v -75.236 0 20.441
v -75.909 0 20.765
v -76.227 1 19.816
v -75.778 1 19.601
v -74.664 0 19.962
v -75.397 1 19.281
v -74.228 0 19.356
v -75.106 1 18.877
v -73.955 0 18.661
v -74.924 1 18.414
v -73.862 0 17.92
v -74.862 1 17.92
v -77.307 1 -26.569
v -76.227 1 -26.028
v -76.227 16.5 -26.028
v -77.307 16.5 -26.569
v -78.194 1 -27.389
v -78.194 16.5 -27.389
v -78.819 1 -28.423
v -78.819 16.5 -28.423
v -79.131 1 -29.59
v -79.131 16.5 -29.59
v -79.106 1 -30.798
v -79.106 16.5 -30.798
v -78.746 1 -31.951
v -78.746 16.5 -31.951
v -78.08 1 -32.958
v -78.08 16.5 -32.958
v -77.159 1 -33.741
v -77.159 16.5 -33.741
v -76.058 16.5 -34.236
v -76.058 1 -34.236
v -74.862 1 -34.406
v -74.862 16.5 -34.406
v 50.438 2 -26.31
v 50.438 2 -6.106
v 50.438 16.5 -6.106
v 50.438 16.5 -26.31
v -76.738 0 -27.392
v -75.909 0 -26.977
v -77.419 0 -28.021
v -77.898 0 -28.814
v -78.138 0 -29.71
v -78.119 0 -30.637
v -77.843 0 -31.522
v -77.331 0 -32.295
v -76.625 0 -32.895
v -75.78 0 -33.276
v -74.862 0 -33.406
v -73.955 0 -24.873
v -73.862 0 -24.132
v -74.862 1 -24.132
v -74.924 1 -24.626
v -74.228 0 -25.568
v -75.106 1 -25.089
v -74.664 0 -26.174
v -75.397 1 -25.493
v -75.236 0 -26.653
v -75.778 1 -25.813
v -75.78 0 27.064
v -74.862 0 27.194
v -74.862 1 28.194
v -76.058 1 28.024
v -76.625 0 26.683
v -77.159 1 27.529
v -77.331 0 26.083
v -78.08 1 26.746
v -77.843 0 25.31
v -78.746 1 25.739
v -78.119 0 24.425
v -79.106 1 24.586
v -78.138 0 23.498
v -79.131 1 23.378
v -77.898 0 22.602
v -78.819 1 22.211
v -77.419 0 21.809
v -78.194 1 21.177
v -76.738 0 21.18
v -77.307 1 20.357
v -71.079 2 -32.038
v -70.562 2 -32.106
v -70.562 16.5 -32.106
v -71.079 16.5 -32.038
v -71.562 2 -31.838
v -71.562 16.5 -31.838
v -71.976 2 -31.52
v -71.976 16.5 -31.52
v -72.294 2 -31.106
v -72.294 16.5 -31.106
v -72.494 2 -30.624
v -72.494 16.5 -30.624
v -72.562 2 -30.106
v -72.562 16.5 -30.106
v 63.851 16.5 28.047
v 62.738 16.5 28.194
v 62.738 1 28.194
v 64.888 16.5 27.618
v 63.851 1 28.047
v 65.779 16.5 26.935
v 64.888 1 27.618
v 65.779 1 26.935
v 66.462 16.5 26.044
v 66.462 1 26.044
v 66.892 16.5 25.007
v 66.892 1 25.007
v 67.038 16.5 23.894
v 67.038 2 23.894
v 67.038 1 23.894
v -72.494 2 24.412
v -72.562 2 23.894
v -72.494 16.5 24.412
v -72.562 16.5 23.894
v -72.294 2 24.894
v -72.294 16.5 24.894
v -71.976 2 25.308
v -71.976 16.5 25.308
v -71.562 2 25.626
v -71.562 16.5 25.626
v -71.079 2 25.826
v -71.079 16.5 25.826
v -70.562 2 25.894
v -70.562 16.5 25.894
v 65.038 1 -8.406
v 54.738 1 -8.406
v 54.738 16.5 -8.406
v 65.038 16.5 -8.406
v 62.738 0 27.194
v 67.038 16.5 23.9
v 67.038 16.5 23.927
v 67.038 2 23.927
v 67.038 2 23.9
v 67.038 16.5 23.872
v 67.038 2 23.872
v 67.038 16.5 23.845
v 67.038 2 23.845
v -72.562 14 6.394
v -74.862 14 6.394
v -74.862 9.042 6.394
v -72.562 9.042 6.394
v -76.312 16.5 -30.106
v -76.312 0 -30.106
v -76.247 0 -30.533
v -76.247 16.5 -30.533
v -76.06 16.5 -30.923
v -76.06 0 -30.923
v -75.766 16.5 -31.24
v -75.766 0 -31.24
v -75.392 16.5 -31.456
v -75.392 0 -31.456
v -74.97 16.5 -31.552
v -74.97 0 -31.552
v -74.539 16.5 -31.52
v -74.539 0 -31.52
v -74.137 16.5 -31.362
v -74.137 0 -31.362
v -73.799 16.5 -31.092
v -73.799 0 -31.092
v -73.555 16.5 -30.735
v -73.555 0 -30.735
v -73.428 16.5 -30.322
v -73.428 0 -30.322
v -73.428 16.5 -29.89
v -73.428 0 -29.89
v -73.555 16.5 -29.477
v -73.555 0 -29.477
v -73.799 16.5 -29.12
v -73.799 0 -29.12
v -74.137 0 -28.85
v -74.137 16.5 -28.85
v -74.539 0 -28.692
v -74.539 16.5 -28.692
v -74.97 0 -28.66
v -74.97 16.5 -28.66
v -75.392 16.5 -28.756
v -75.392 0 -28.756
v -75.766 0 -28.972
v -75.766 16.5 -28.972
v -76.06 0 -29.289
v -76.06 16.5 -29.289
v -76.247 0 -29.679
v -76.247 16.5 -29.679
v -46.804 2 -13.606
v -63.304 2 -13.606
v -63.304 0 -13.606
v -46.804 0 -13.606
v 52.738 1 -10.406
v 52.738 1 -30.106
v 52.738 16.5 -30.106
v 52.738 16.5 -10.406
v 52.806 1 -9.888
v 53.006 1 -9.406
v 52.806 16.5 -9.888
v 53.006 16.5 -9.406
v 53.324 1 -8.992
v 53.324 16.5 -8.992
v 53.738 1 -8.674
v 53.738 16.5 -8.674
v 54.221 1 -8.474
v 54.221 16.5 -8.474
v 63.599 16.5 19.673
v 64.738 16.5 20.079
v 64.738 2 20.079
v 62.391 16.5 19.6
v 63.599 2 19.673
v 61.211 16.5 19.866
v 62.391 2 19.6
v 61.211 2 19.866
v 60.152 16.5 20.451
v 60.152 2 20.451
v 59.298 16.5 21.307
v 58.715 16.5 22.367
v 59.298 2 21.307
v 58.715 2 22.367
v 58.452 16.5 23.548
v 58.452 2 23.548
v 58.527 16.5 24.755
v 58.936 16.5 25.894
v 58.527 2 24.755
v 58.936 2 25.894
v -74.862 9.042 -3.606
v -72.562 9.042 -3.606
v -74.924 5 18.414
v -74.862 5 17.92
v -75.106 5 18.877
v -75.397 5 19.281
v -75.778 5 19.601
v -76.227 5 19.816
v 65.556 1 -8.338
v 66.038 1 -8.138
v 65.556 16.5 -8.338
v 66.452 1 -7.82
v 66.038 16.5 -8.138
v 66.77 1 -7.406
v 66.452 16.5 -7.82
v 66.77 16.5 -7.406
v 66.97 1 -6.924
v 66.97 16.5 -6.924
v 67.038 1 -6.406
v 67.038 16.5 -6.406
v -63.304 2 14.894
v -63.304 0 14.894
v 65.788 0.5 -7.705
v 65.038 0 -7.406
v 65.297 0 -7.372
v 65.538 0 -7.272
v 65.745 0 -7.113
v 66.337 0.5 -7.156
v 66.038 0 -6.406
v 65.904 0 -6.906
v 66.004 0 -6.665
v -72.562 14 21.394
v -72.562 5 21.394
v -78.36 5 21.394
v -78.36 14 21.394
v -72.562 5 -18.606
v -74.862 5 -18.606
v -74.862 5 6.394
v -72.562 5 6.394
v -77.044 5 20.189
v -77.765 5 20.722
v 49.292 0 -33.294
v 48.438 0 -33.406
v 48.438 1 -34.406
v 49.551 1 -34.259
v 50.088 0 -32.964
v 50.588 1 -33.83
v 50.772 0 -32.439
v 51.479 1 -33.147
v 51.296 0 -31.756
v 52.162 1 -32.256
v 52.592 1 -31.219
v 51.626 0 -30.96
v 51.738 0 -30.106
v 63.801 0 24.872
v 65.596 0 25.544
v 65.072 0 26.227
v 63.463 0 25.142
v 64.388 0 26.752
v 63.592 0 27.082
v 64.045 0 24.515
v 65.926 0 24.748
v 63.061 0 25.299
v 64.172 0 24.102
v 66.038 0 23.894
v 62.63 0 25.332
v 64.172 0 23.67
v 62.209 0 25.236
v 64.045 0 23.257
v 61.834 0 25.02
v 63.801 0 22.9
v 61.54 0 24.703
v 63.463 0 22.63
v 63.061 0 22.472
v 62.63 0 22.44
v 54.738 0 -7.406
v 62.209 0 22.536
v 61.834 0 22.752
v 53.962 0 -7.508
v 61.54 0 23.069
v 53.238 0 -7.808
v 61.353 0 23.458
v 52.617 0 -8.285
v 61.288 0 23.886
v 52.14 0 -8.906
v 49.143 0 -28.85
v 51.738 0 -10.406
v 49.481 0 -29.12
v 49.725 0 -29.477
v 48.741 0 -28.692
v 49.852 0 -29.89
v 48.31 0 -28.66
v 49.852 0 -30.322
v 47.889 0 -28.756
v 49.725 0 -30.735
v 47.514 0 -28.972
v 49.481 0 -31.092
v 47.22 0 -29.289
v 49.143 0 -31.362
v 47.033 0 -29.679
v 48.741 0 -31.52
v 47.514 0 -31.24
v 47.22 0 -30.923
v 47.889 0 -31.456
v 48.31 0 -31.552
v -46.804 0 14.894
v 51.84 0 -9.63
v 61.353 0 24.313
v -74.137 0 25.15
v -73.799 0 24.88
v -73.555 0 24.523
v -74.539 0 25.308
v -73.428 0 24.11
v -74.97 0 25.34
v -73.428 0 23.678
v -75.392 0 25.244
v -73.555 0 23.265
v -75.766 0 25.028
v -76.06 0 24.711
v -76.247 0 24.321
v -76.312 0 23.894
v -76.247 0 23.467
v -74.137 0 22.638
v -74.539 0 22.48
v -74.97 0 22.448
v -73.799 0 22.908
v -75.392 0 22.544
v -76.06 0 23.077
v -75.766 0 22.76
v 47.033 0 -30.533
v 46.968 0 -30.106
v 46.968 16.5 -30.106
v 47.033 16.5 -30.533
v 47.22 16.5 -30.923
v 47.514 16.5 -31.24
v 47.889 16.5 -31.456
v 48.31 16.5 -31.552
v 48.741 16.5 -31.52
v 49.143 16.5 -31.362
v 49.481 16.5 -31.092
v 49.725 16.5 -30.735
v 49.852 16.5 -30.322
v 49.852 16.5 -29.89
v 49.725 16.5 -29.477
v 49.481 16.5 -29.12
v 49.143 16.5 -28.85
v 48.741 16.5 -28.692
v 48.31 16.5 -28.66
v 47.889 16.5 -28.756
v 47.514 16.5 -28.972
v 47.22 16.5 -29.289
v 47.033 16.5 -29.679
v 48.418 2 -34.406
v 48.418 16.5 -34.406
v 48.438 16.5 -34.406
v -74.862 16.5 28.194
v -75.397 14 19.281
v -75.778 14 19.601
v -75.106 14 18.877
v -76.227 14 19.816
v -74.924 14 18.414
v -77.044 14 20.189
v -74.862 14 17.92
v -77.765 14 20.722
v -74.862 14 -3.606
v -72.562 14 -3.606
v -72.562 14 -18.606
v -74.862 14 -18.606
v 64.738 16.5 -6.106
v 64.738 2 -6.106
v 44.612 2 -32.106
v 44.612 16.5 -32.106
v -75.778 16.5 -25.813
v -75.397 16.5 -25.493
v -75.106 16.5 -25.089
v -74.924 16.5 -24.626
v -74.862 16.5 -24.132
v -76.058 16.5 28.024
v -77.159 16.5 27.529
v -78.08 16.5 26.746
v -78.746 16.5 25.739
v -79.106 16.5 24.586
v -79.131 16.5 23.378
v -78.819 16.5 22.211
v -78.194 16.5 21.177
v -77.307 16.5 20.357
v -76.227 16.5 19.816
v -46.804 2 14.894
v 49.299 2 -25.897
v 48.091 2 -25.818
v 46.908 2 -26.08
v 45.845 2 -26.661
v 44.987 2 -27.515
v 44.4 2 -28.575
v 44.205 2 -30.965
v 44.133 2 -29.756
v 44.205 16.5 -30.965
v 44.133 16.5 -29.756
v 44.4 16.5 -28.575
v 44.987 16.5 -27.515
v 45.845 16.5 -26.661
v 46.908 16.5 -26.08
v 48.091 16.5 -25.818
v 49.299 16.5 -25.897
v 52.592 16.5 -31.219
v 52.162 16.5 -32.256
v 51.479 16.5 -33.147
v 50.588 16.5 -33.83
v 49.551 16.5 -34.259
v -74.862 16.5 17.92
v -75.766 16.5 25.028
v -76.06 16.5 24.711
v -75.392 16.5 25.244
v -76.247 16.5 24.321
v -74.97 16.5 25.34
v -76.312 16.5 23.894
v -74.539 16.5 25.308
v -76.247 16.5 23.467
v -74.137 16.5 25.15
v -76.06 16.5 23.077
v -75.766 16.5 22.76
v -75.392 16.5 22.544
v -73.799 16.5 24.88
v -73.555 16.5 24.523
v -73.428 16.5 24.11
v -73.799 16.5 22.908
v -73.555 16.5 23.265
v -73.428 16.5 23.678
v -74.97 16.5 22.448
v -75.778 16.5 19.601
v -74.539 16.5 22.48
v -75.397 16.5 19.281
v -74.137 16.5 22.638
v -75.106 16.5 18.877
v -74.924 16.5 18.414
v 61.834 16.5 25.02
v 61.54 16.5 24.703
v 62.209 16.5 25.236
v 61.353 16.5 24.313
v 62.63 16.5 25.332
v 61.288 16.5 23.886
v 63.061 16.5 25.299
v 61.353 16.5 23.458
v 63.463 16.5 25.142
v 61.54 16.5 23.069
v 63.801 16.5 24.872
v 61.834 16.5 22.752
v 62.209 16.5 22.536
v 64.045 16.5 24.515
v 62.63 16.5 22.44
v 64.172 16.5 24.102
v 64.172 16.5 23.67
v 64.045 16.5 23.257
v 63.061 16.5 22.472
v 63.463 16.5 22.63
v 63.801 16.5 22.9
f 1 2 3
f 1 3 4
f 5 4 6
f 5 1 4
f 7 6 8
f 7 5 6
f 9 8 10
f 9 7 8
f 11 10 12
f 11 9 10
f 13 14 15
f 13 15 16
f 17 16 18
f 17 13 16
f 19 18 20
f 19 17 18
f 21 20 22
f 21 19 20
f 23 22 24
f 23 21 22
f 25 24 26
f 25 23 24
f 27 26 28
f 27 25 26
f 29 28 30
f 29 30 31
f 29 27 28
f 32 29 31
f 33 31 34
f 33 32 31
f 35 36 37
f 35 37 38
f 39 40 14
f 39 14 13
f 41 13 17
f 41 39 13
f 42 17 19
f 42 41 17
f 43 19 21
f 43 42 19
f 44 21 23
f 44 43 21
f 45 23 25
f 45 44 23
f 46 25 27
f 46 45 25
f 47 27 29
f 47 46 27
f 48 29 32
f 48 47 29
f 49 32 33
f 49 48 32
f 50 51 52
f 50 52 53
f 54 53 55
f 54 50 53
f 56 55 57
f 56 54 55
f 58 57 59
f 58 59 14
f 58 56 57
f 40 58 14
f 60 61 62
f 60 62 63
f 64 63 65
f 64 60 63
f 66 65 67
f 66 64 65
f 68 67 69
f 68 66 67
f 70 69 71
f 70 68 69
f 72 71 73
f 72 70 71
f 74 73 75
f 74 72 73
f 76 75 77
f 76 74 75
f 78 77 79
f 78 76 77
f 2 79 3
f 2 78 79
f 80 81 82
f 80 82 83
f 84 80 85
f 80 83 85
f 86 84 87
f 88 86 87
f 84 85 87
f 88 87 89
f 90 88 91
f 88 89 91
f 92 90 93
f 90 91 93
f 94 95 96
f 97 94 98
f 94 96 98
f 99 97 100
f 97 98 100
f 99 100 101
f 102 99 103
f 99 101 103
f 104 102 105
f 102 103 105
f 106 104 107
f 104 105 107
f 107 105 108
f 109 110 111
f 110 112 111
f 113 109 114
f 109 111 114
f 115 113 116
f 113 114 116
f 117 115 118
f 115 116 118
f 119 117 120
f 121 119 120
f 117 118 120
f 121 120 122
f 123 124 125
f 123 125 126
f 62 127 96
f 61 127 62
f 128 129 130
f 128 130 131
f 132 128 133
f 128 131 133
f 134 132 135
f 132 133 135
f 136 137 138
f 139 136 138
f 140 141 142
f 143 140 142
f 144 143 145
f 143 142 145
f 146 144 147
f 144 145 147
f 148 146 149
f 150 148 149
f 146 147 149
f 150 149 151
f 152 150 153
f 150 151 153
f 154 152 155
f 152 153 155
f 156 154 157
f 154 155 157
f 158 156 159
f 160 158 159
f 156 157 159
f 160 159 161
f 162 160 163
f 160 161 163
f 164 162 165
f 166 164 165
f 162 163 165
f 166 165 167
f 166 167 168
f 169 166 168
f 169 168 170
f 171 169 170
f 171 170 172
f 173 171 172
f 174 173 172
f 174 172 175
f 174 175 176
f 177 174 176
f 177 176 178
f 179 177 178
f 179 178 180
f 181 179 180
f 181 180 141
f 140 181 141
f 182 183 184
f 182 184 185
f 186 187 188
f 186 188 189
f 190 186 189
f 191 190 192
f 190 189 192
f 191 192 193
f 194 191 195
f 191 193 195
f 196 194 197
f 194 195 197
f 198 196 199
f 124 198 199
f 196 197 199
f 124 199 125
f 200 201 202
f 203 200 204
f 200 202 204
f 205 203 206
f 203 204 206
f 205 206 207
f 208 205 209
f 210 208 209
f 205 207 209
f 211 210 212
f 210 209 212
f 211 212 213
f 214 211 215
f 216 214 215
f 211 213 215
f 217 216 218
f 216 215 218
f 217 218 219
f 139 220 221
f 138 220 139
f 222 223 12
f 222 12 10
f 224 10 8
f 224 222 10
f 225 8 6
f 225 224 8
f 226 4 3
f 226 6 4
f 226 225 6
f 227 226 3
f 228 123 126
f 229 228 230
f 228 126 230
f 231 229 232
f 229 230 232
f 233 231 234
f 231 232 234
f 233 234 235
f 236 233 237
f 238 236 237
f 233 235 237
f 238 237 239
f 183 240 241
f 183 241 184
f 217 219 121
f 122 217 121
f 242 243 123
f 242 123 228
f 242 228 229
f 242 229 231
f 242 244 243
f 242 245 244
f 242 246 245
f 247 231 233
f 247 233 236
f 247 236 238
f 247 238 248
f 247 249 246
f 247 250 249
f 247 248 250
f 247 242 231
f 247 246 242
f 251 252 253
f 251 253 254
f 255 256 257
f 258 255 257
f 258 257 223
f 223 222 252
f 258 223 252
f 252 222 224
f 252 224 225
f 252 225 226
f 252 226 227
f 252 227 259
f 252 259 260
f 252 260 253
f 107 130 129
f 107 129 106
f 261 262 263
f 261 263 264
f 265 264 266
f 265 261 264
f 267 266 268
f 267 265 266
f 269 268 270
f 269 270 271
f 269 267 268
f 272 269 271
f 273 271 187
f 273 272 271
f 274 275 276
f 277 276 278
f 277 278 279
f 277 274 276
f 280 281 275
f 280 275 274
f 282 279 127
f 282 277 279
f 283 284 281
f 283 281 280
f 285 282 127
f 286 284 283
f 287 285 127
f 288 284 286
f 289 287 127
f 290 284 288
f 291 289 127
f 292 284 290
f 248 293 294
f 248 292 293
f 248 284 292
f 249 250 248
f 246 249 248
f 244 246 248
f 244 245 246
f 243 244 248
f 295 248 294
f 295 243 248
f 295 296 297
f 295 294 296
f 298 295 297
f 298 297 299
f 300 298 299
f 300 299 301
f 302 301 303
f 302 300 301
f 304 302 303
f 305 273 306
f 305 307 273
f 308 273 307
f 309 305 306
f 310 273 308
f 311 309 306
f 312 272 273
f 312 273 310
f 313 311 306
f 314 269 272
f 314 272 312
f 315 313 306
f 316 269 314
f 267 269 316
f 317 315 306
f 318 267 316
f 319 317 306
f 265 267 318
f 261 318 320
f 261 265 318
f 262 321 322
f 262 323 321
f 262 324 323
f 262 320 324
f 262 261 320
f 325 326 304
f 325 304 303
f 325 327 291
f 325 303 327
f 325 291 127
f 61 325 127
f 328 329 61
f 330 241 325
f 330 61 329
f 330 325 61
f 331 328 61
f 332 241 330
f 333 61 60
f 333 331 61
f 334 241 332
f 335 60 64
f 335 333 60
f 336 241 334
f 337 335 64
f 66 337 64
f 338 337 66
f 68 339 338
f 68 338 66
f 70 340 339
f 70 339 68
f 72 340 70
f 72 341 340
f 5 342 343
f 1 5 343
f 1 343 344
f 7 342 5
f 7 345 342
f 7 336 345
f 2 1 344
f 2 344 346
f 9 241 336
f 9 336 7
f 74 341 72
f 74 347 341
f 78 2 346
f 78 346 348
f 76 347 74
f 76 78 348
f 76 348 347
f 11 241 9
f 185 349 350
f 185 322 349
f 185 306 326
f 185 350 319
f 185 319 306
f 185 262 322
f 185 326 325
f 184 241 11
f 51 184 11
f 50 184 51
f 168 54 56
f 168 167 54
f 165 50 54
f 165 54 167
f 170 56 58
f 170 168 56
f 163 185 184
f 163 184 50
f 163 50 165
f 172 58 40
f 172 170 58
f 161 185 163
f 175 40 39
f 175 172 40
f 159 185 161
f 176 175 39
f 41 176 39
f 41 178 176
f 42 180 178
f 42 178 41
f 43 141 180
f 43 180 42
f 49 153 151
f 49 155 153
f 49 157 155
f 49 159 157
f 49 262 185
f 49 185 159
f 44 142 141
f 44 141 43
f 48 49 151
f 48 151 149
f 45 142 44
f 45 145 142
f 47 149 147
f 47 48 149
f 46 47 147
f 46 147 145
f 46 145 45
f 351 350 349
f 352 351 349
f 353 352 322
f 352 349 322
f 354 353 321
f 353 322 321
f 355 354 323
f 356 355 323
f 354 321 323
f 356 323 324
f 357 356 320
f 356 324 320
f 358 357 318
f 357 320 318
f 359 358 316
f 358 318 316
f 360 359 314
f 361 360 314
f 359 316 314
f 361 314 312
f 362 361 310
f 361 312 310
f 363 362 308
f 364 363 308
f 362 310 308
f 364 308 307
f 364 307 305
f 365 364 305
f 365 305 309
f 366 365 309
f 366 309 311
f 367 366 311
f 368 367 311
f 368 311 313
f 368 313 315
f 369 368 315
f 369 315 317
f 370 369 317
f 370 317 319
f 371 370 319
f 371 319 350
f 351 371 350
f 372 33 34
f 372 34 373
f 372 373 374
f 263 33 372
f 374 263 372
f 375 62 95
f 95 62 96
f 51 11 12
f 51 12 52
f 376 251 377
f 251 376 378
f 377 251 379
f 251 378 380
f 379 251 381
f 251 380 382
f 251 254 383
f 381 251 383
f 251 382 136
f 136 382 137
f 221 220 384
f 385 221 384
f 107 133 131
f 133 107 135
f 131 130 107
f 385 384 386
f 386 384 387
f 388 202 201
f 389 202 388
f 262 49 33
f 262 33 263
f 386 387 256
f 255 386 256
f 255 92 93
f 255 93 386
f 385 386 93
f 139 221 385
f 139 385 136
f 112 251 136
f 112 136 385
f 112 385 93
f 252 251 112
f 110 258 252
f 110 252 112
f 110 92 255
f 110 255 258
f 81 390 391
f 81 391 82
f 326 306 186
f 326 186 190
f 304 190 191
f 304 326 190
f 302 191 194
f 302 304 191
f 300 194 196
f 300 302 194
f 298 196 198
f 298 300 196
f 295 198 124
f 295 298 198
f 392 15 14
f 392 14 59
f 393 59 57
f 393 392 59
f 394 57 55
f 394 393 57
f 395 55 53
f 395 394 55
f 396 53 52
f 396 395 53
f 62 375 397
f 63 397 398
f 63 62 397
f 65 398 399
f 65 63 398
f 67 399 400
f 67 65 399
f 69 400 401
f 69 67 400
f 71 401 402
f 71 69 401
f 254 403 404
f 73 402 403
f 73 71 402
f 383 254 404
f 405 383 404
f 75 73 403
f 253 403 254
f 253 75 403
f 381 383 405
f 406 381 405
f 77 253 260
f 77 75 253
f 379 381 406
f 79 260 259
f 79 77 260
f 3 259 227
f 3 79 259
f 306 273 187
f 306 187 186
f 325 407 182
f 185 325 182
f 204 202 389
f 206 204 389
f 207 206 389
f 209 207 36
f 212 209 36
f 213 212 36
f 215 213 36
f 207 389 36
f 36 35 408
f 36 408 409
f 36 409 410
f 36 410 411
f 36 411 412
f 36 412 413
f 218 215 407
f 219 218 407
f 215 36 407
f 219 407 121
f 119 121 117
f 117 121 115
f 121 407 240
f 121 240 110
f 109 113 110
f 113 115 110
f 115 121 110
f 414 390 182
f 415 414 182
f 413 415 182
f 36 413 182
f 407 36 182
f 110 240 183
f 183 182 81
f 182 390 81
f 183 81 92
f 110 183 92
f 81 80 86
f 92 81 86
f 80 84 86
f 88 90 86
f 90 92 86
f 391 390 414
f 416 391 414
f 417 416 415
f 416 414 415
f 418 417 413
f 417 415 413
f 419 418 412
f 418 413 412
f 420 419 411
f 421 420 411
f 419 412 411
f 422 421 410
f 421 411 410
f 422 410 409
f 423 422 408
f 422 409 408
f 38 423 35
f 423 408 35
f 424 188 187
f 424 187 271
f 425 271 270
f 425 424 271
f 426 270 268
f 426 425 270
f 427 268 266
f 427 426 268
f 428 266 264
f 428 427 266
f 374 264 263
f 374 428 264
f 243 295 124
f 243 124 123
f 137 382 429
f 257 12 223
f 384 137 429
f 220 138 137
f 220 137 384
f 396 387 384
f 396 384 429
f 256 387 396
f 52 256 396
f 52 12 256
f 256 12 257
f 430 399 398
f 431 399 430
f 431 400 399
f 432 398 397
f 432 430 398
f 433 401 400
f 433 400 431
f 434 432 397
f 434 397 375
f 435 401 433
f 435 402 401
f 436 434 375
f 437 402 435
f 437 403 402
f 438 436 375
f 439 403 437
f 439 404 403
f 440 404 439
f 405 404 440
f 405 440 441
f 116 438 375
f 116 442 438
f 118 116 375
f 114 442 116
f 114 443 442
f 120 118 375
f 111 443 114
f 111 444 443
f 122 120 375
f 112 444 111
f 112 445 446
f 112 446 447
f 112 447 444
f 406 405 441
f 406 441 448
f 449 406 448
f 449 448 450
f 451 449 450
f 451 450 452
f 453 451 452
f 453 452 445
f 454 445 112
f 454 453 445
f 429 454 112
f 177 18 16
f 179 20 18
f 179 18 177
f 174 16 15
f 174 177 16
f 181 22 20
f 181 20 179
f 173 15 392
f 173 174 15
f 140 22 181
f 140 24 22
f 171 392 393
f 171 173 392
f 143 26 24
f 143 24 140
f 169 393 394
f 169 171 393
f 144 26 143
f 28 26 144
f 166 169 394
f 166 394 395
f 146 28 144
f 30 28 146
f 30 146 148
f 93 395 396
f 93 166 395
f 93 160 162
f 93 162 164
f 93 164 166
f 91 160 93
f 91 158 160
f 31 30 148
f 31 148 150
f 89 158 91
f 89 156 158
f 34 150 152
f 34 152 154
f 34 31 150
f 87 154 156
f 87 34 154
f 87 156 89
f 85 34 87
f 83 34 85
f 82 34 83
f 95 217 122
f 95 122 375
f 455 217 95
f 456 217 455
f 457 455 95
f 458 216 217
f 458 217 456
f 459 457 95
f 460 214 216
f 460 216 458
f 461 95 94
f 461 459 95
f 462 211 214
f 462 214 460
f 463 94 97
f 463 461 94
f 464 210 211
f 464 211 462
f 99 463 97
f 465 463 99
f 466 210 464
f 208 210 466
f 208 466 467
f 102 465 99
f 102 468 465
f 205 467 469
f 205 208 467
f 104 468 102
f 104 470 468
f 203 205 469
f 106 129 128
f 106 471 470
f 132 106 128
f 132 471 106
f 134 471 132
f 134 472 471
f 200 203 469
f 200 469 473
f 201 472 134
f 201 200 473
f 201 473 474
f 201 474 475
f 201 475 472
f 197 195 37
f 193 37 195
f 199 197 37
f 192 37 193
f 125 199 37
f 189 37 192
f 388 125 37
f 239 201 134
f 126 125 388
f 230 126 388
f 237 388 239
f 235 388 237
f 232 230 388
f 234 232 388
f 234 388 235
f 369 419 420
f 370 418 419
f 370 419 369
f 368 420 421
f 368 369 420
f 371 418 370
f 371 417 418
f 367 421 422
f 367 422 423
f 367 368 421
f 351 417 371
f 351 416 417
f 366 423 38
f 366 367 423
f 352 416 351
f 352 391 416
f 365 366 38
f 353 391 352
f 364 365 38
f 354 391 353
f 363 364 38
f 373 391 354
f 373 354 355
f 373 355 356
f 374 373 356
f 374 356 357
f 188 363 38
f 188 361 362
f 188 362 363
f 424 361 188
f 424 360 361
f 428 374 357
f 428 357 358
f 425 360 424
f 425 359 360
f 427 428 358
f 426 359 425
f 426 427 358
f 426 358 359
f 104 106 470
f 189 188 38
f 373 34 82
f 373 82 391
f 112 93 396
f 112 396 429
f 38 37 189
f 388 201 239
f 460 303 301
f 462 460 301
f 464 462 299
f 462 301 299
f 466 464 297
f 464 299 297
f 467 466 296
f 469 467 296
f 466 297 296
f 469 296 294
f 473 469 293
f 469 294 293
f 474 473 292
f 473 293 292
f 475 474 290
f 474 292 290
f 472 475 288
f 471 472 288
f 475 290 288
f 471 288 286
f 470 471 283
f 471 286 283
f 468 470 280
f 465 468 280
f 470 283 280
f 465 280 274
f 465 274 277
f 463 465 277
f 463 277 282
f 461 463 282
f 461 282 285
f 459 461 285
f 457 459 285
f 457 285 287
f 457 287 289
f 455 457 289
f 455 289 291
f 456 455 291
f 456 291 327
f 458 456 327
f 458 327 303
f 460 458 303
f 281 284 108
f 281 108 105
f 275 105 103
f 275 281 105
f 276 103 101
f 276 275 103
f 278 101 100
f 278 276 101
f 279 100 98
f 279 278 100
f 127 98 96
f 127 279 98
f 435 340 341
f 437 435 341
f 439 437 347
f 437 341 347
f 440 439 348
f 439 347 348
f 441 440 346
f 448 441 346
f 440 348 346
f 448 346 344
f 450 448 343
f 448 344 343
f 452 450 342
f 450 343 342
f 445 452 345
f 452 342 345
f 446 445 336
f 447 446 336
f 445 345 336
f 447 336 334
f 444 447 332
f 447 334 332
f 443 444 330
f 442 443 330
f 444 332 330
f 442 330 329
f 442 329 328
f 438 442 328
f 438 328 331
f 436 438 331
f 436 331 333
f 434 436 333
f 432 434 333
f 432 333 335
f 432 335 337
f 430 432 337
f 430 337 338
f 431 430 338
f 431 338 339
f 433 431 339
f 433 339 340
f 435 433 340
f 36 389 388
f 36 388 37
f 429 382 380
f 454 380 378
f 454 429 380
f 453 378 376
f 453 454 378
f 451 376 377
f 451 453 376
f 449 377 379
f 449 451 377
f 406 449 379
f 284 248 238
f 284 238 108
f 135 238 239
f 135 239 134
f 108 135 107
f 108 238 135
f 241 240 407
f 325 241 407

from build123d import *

# Parameters (mm, degrees)
BOSS_EXTRUDE1_DEPTH            = 16.5
BOSS_EXTRUDE2_DEPTH            = 2
FILLET6_R                      = 2
FILLET8_R                      = 2
BOSS_EXTRUDE6_DEPTH            = 16.5
F_2_9_2_9_DIAMETER_HOLE2_D     = 2.9
F_2_9_2_9_DIAMETER_HOLE1_D     = 2.9
SKETCH24_R                     = 4.3
BOSS_EXTRUDE7_DEPTH            = 14.5
F_2_9_2_9_DIAMETER_HOLE3_D     = 2.9
F_2_9_2_9_DIAMETER_HOLE4_D     = 2.9
FILLET10_R                     = 4.3
FILLET16_R                     = 4.3
FILLET17_R                     = 2
FILLET18_R                     = 2
CHAMFER5_SIZE                  = 1
SKETCH29_W                     = 16.5
SKETCH29_H                     = 28.5
CUT_EXTRUDE1_DEPTH             = 10
CUT_EXTRUDE2_REACH             = 148.941
SKETCH30_W                     = 10
SKETCH30_H                     = 4.042033075
SKETCH30_W_2                   = 3.474110813
SKETCH30_H_2                   = 9
CUT_EXTRUDE2_DIRECTION_2_DEPTH = 147.941105233


with BuildPart() as part:
    # Sketch3 → Boss-Extrude1 (new body)
    with BuildSketch(Plane(origin=(0, 0, 0), x_dir=(1, 0, 0), z_dir=(0, 1, 0))):
        Polygon((52.738233838, 8.405993834), (67.038233838, 8.405993834), (67.038233838, -28.194006166), (52.738233838, -28.194006166), (-74.861766162, -28.194006166), (-74.861766162, 34.405993834), (52.738233838, 34.405993834), align=None)
        Polygon((55.038233838, -25.894006166), (64.738233838, -25.894006166), (64.738233838, 6.105993834), (50.438233838, 6.105993834), (50.438233838, 32.105993834), (-72.561766162, 32.105993834), (-72.561766162, -25.894006166), (50.438233838, -25.894006166), align=None, mode=Mode.SUBTRACT)
    extrude(amount=BOSS_EXTRUDE1_DEPTH)

    # Sketch5 → Boss-Extrude2 (add)
    with BuildSketch(Plane(origin=(0, 0, 0), x_dir=(1, 0, 0), z_dir=(0, 1, 0))):
        Polygon((-72.561766162, 32.105993834), (50.438233838, 32.105993834), (50.438233838, 6.105993834), (64.738233838, 6.105993834), (64.738233838, -25.894006166), (50.438233838, -25.894006166), (-72.561766162, -25.894006166), align=None)
    extrude(amount=BOSS_EXTRUDE2_DEPTH)

    # Fillet6
    fillet6_edges = [part.edges().sort_by_distance(p)[0] for p in [
        (50.438233838, 9.25, -32.105993834),
    ]]
    fillet(fillet6_edges, radius=FILLET6_R)

    # Fillet8
    fillet8_edges = [part.edges().sort_by_distance(p)[0] for p in [
        (-72.561766162, 9.25, -32.105993834),
        (-72.561766162, 9.25, 25.894006166),
    ]]
    fillet(fillet8_edges, radius=FILLET8_R)

    # Sketch17 → Boss-Extrude6 (add)
    with BuildSketch(Plane(origin=(0, 0, 0), x_dir=(1, 0, 0), z_dir=(0, 1, 0))):
        with BuildLine():
            Line((-74.861766162, 34.405993834), (-74.861766162, 25.805993834))
            ThreePointArc((-74.861766162, 25.805993834), (-79.161766162, 30.105993834), (-74.861766162, 34.405993834))
        make_face()
        with BuildLine():
            Line((-74.861766162, -19.594006166), (-74.861766162, -28.194006166))
            ThreePointArc((-74.861766162, -28.194006166), (-79.161766162, -23.894006166), (-74.861766162, -19.594006166))
        make_face()
    extrude(amount=BOSS_EXTRUDE6_DEPTH)

    # Ø2.9 (2.9) Diameter Hole2 (through all)
    with Locations(Plane(origin=(0, 16.5, 0), x_dir=(1, 0, 0), z_dir=(0, 1, 0))):
        with Locations((-74.861766162, 30.105993834)):
            Hole(F_2_9_2_9_DIAMETER_HOLE2_D / 2)

    # Ø2.9 (2.9) Diameter Hole1 (through all)
    with Locations(Plane(origin=(0, 16.5, 0), x_dir=(1, 0, 0), z_dir=(0, 1, 0))):
        with Locations((-74.861766162, -23.894006166)):
            Hole(F_2_9_2_9_DIAMETER_HOLE1_D / 2)

    # Sketch24 → Boss-Extrude7 (add)
    with BuildSketch(Plane(origin=(0, 2, 0), x_dir=(1, 0, 0), z_dir=(0, 1, 0))):
        with Locations((62.738431143, -23.885848487)):
            Circle(SKETCH24_R)
        with Locations((48.418494527, 30.105993834)):
            Circle(SKETCH24_R)
    extrude(amount=BOSS_EXTRUDE7_DEPTH)

    # Ø2.9 (2.9) Diameter Hole3 (through all)
    with Locations(Plane(origin=(0, 16.5, 0), x_dir=(1, 0, 0), z_dir=(0, 1, 0))):
        with Locations((62.738431143, -23.885848487)):
            Hole(F_2_9_2_9_DIAMETER_HOLE3_D / 2)

    # Ø2.9 (2.9) Diameter Hole4 (through all)
    with Locations(Plane(origin=(0, 16.5, 0), x_dir=(1, 0, 0), z_dir=(0, 1, 0))):
        with Locations((48.418494527, 30.105993834)):
            Hole(F_2_9_2_9_DIAMETER_HOLE4_D / 2)

    # Fillet10
    fillet10_edges = [part.edges().sort_by_distance(p)[0] for p in [
        (52.738233838, 8.25, -34.405993834),
    ]]
    fillet(fillet10_edges, radius=FILLET10_R)

    # Fillet16
    # the kernel refuses this fillet: 4.3 mm, written as the material it takes off along each edge
    with BuildSketch(Plane(origin=(67.038233838, -10.75, 28.194006166), x_dir=(0, 0, -1), z_dir=(0, 1, 0))) as fillet16_piece_1:
        with BuildLine():
            CenterArc((FILLET16_R, FILLET16_R), FILLET16_R, 180, 90)
            Line((0, FILLET16_R), (0, 0))
            Line((0, 0), (FILLET16_R, 0))
        make_face()
    extrude(amount=38, mode=Mode.SUBTRACT)

    # Fillet17
    fillet17_edges = [part.edges().sort_by_distance(p)[0] for p in [
        (52.738233838, 8.25, -8.405993834),
        (67.038233838, 8.25, -8.405993834),
    ]]
    fillet(fillet17_edges, radius=FILLET17_R)

    # Fillet18
    fillet18_edges = [part.edges().sort_by_distance(p)[0] for p in [
        (-74.861766162, 8.25, -25.805993834),
        (-74.861766162, 8.25, 19.594006166),
    ]]
    fillet(fillet18_edges, radius=FILLET18_R)

    # Chamfer5
    chamfer5_edges = [part.edges().sort_by_distance(p)[0] for p in [
        (-13.211766162, 0, -34.405993834),
        (51.478792997, 0, -33.146552993),
        (67.038233838, 0, 8.744006166),
        (65.778792997, 0, 26.934565325),
        (52.738233838, 0, -20.255993834),
        (59.888233838, 0, -8.405993834),
        (66.4524474, 0, -7.820207397),
        (53.324020275, 0, -8.991780272),
        (-79.105793795, 0, 24.585547524),
        (-74.861766162, 0, -3.105993834),
        (-75.2385223, 0, 19.088261462),
        (-75.2385223, 0, -25.300249131),
        (-6.061766162, 0, 28.194006166),
        (-79.105793795, 0, -30.797535193),
    ]]
    chamfer(chamfer5_edges, length=CHAMFER5_SIZE)

    # Sketch29 → Cut-Extrude1 (cut)
    with BuildSketch(Plane(origin=(0, 2, 0), x_dir=(1, 0, 0), z_dir=(0, 1, 0))):
        with Locations((-55.053624673, -0.644006166)):
            Rectangle(SKETCH29_W, SKETCH29_H)
    extrude(amount=-CUT_EXTRUDE1_DEPTH, mode=Mode.SUBTRACT)

    # Sketch30 → Cut-Extrude2 (cut, up to next)
    with BuildSketch(Plane.ZY.offset(74.861766162), mode=Mode.PRIVATE) as cut_extrude2_sk1:
        with Locations((1.394006166, 7.021016538)):
            Rectangle(SKETCH30_W, SKETCH30_H)
    cut_extrude2_tool1 = extrude(cut_extrude2_sk1.sketch, amount=-CUT_EXTRUDE2_REACH, mode=Mode.PRIVATE) & part.part
    # Sketch30 → Cut-Extrude2 (cut, up to next)
    with BuildSketch(Plane.ZY.offset(74.861766162), mode=Mode.PRIVATE) as cut_extrude2_sk2:
        Polygon((-3.605993834, 5), (-3.605993834, 9.042033075), (-3.605993834, 14), (-18.605993834, 14), (-18.605993834, 5), align=None)
    cut_extrude2_tool2 = extrude(cut_extrude2_sk2.sketch, amount=-CUT_EXTRUDE2_REACH, mode=Mode.PRIVATE) & part.part
    # Sketch30 → Cut-Extrude2 (cut, up to next)
    with BuildSketch(Plane.ZY.offset(74.861766162), mode=Mode.PRIVATE) as cut_extrude2_sk3:
        Polygon((6.394006166, 14), (6.394006166, 9.042033075), (6.394006166, 5), (17.919895353, 5), (17.919895353, 14), align=None)
    cut_extrude2_tool3 = extrude(cut_extrude2_sk3.sketch, amount=-CUT_EXTRUDE2_REACH, mode=Mode.PRIVATE) & part.part
    # Sketch30 → Cut-Extrude2 (cut, up to next)
    with BuildSketch(Plane.ZY.offset(74.861766162), mode=Mode.PRIVATE) as cut_extrude2_sk4:
        with Locations((19.656950759, 9.5)):
            Rectangle(SKETCH30_W_2, SKETCH30_H_2)
    cut_extrude2_tool4 = extrude(cut_extrude2_sk4.sketch, amount=-CUT_EXTRUDE2_REACH, mode=Mode.PRIVATE) & part.part
    add(cut_extrude2_tool1.solids().sort_by_distance((-74.861766, 7.021017, 1.394006))[0], mode=Mode.SUBTRACT)
    add(cut_extrude2_tool2.solids().sort_by_distance((-74.861766, 9.5, -11.105994))[0], mode=Mode.SUBTRACT)
    add(cut_extrude2_tool3.solids().sort_by_distance((-74.861766, 9.5, 12.156951))[0], mode=Mode.SUBTRACT)
    add(cut_extrude2_tool4.solids().sort_by_distance((-74.861766, 9.5, 19.656951))[0], mode=Mode.SUBTRACT)

    # Sketch30 → Cut-Extrude2 direction 2 (cut)
    with BuildSketch(Plane.ZY.offset(74.861766162)):
        with Locations((1.394006166, 7.021016538)):
            Rectangle(SKETCH30_W, SKETCH30_H)
        Polygon((-3.605993834, 5), (-3.605993834, 9.042033075), (-3.605993834, 14), (-18.605993834, 14), (-18.605993834, 5), align=None)
        Polygon((6.394006166, 14), (6.394006166, 9.042033075), (6.394006166, 5), (17.919895353, 5), (17.919895353, 14), align=None)
        with Locations((19.656950759, 9.5)):
            Rectangle(SKETCH30_W_2, SKETCH30_H_2)
    extrude(amount=CUT_EXTRUDE2_DIRECTION_2_DEPTH, mode=Mode.SUBTRACT)


solid = part.part
